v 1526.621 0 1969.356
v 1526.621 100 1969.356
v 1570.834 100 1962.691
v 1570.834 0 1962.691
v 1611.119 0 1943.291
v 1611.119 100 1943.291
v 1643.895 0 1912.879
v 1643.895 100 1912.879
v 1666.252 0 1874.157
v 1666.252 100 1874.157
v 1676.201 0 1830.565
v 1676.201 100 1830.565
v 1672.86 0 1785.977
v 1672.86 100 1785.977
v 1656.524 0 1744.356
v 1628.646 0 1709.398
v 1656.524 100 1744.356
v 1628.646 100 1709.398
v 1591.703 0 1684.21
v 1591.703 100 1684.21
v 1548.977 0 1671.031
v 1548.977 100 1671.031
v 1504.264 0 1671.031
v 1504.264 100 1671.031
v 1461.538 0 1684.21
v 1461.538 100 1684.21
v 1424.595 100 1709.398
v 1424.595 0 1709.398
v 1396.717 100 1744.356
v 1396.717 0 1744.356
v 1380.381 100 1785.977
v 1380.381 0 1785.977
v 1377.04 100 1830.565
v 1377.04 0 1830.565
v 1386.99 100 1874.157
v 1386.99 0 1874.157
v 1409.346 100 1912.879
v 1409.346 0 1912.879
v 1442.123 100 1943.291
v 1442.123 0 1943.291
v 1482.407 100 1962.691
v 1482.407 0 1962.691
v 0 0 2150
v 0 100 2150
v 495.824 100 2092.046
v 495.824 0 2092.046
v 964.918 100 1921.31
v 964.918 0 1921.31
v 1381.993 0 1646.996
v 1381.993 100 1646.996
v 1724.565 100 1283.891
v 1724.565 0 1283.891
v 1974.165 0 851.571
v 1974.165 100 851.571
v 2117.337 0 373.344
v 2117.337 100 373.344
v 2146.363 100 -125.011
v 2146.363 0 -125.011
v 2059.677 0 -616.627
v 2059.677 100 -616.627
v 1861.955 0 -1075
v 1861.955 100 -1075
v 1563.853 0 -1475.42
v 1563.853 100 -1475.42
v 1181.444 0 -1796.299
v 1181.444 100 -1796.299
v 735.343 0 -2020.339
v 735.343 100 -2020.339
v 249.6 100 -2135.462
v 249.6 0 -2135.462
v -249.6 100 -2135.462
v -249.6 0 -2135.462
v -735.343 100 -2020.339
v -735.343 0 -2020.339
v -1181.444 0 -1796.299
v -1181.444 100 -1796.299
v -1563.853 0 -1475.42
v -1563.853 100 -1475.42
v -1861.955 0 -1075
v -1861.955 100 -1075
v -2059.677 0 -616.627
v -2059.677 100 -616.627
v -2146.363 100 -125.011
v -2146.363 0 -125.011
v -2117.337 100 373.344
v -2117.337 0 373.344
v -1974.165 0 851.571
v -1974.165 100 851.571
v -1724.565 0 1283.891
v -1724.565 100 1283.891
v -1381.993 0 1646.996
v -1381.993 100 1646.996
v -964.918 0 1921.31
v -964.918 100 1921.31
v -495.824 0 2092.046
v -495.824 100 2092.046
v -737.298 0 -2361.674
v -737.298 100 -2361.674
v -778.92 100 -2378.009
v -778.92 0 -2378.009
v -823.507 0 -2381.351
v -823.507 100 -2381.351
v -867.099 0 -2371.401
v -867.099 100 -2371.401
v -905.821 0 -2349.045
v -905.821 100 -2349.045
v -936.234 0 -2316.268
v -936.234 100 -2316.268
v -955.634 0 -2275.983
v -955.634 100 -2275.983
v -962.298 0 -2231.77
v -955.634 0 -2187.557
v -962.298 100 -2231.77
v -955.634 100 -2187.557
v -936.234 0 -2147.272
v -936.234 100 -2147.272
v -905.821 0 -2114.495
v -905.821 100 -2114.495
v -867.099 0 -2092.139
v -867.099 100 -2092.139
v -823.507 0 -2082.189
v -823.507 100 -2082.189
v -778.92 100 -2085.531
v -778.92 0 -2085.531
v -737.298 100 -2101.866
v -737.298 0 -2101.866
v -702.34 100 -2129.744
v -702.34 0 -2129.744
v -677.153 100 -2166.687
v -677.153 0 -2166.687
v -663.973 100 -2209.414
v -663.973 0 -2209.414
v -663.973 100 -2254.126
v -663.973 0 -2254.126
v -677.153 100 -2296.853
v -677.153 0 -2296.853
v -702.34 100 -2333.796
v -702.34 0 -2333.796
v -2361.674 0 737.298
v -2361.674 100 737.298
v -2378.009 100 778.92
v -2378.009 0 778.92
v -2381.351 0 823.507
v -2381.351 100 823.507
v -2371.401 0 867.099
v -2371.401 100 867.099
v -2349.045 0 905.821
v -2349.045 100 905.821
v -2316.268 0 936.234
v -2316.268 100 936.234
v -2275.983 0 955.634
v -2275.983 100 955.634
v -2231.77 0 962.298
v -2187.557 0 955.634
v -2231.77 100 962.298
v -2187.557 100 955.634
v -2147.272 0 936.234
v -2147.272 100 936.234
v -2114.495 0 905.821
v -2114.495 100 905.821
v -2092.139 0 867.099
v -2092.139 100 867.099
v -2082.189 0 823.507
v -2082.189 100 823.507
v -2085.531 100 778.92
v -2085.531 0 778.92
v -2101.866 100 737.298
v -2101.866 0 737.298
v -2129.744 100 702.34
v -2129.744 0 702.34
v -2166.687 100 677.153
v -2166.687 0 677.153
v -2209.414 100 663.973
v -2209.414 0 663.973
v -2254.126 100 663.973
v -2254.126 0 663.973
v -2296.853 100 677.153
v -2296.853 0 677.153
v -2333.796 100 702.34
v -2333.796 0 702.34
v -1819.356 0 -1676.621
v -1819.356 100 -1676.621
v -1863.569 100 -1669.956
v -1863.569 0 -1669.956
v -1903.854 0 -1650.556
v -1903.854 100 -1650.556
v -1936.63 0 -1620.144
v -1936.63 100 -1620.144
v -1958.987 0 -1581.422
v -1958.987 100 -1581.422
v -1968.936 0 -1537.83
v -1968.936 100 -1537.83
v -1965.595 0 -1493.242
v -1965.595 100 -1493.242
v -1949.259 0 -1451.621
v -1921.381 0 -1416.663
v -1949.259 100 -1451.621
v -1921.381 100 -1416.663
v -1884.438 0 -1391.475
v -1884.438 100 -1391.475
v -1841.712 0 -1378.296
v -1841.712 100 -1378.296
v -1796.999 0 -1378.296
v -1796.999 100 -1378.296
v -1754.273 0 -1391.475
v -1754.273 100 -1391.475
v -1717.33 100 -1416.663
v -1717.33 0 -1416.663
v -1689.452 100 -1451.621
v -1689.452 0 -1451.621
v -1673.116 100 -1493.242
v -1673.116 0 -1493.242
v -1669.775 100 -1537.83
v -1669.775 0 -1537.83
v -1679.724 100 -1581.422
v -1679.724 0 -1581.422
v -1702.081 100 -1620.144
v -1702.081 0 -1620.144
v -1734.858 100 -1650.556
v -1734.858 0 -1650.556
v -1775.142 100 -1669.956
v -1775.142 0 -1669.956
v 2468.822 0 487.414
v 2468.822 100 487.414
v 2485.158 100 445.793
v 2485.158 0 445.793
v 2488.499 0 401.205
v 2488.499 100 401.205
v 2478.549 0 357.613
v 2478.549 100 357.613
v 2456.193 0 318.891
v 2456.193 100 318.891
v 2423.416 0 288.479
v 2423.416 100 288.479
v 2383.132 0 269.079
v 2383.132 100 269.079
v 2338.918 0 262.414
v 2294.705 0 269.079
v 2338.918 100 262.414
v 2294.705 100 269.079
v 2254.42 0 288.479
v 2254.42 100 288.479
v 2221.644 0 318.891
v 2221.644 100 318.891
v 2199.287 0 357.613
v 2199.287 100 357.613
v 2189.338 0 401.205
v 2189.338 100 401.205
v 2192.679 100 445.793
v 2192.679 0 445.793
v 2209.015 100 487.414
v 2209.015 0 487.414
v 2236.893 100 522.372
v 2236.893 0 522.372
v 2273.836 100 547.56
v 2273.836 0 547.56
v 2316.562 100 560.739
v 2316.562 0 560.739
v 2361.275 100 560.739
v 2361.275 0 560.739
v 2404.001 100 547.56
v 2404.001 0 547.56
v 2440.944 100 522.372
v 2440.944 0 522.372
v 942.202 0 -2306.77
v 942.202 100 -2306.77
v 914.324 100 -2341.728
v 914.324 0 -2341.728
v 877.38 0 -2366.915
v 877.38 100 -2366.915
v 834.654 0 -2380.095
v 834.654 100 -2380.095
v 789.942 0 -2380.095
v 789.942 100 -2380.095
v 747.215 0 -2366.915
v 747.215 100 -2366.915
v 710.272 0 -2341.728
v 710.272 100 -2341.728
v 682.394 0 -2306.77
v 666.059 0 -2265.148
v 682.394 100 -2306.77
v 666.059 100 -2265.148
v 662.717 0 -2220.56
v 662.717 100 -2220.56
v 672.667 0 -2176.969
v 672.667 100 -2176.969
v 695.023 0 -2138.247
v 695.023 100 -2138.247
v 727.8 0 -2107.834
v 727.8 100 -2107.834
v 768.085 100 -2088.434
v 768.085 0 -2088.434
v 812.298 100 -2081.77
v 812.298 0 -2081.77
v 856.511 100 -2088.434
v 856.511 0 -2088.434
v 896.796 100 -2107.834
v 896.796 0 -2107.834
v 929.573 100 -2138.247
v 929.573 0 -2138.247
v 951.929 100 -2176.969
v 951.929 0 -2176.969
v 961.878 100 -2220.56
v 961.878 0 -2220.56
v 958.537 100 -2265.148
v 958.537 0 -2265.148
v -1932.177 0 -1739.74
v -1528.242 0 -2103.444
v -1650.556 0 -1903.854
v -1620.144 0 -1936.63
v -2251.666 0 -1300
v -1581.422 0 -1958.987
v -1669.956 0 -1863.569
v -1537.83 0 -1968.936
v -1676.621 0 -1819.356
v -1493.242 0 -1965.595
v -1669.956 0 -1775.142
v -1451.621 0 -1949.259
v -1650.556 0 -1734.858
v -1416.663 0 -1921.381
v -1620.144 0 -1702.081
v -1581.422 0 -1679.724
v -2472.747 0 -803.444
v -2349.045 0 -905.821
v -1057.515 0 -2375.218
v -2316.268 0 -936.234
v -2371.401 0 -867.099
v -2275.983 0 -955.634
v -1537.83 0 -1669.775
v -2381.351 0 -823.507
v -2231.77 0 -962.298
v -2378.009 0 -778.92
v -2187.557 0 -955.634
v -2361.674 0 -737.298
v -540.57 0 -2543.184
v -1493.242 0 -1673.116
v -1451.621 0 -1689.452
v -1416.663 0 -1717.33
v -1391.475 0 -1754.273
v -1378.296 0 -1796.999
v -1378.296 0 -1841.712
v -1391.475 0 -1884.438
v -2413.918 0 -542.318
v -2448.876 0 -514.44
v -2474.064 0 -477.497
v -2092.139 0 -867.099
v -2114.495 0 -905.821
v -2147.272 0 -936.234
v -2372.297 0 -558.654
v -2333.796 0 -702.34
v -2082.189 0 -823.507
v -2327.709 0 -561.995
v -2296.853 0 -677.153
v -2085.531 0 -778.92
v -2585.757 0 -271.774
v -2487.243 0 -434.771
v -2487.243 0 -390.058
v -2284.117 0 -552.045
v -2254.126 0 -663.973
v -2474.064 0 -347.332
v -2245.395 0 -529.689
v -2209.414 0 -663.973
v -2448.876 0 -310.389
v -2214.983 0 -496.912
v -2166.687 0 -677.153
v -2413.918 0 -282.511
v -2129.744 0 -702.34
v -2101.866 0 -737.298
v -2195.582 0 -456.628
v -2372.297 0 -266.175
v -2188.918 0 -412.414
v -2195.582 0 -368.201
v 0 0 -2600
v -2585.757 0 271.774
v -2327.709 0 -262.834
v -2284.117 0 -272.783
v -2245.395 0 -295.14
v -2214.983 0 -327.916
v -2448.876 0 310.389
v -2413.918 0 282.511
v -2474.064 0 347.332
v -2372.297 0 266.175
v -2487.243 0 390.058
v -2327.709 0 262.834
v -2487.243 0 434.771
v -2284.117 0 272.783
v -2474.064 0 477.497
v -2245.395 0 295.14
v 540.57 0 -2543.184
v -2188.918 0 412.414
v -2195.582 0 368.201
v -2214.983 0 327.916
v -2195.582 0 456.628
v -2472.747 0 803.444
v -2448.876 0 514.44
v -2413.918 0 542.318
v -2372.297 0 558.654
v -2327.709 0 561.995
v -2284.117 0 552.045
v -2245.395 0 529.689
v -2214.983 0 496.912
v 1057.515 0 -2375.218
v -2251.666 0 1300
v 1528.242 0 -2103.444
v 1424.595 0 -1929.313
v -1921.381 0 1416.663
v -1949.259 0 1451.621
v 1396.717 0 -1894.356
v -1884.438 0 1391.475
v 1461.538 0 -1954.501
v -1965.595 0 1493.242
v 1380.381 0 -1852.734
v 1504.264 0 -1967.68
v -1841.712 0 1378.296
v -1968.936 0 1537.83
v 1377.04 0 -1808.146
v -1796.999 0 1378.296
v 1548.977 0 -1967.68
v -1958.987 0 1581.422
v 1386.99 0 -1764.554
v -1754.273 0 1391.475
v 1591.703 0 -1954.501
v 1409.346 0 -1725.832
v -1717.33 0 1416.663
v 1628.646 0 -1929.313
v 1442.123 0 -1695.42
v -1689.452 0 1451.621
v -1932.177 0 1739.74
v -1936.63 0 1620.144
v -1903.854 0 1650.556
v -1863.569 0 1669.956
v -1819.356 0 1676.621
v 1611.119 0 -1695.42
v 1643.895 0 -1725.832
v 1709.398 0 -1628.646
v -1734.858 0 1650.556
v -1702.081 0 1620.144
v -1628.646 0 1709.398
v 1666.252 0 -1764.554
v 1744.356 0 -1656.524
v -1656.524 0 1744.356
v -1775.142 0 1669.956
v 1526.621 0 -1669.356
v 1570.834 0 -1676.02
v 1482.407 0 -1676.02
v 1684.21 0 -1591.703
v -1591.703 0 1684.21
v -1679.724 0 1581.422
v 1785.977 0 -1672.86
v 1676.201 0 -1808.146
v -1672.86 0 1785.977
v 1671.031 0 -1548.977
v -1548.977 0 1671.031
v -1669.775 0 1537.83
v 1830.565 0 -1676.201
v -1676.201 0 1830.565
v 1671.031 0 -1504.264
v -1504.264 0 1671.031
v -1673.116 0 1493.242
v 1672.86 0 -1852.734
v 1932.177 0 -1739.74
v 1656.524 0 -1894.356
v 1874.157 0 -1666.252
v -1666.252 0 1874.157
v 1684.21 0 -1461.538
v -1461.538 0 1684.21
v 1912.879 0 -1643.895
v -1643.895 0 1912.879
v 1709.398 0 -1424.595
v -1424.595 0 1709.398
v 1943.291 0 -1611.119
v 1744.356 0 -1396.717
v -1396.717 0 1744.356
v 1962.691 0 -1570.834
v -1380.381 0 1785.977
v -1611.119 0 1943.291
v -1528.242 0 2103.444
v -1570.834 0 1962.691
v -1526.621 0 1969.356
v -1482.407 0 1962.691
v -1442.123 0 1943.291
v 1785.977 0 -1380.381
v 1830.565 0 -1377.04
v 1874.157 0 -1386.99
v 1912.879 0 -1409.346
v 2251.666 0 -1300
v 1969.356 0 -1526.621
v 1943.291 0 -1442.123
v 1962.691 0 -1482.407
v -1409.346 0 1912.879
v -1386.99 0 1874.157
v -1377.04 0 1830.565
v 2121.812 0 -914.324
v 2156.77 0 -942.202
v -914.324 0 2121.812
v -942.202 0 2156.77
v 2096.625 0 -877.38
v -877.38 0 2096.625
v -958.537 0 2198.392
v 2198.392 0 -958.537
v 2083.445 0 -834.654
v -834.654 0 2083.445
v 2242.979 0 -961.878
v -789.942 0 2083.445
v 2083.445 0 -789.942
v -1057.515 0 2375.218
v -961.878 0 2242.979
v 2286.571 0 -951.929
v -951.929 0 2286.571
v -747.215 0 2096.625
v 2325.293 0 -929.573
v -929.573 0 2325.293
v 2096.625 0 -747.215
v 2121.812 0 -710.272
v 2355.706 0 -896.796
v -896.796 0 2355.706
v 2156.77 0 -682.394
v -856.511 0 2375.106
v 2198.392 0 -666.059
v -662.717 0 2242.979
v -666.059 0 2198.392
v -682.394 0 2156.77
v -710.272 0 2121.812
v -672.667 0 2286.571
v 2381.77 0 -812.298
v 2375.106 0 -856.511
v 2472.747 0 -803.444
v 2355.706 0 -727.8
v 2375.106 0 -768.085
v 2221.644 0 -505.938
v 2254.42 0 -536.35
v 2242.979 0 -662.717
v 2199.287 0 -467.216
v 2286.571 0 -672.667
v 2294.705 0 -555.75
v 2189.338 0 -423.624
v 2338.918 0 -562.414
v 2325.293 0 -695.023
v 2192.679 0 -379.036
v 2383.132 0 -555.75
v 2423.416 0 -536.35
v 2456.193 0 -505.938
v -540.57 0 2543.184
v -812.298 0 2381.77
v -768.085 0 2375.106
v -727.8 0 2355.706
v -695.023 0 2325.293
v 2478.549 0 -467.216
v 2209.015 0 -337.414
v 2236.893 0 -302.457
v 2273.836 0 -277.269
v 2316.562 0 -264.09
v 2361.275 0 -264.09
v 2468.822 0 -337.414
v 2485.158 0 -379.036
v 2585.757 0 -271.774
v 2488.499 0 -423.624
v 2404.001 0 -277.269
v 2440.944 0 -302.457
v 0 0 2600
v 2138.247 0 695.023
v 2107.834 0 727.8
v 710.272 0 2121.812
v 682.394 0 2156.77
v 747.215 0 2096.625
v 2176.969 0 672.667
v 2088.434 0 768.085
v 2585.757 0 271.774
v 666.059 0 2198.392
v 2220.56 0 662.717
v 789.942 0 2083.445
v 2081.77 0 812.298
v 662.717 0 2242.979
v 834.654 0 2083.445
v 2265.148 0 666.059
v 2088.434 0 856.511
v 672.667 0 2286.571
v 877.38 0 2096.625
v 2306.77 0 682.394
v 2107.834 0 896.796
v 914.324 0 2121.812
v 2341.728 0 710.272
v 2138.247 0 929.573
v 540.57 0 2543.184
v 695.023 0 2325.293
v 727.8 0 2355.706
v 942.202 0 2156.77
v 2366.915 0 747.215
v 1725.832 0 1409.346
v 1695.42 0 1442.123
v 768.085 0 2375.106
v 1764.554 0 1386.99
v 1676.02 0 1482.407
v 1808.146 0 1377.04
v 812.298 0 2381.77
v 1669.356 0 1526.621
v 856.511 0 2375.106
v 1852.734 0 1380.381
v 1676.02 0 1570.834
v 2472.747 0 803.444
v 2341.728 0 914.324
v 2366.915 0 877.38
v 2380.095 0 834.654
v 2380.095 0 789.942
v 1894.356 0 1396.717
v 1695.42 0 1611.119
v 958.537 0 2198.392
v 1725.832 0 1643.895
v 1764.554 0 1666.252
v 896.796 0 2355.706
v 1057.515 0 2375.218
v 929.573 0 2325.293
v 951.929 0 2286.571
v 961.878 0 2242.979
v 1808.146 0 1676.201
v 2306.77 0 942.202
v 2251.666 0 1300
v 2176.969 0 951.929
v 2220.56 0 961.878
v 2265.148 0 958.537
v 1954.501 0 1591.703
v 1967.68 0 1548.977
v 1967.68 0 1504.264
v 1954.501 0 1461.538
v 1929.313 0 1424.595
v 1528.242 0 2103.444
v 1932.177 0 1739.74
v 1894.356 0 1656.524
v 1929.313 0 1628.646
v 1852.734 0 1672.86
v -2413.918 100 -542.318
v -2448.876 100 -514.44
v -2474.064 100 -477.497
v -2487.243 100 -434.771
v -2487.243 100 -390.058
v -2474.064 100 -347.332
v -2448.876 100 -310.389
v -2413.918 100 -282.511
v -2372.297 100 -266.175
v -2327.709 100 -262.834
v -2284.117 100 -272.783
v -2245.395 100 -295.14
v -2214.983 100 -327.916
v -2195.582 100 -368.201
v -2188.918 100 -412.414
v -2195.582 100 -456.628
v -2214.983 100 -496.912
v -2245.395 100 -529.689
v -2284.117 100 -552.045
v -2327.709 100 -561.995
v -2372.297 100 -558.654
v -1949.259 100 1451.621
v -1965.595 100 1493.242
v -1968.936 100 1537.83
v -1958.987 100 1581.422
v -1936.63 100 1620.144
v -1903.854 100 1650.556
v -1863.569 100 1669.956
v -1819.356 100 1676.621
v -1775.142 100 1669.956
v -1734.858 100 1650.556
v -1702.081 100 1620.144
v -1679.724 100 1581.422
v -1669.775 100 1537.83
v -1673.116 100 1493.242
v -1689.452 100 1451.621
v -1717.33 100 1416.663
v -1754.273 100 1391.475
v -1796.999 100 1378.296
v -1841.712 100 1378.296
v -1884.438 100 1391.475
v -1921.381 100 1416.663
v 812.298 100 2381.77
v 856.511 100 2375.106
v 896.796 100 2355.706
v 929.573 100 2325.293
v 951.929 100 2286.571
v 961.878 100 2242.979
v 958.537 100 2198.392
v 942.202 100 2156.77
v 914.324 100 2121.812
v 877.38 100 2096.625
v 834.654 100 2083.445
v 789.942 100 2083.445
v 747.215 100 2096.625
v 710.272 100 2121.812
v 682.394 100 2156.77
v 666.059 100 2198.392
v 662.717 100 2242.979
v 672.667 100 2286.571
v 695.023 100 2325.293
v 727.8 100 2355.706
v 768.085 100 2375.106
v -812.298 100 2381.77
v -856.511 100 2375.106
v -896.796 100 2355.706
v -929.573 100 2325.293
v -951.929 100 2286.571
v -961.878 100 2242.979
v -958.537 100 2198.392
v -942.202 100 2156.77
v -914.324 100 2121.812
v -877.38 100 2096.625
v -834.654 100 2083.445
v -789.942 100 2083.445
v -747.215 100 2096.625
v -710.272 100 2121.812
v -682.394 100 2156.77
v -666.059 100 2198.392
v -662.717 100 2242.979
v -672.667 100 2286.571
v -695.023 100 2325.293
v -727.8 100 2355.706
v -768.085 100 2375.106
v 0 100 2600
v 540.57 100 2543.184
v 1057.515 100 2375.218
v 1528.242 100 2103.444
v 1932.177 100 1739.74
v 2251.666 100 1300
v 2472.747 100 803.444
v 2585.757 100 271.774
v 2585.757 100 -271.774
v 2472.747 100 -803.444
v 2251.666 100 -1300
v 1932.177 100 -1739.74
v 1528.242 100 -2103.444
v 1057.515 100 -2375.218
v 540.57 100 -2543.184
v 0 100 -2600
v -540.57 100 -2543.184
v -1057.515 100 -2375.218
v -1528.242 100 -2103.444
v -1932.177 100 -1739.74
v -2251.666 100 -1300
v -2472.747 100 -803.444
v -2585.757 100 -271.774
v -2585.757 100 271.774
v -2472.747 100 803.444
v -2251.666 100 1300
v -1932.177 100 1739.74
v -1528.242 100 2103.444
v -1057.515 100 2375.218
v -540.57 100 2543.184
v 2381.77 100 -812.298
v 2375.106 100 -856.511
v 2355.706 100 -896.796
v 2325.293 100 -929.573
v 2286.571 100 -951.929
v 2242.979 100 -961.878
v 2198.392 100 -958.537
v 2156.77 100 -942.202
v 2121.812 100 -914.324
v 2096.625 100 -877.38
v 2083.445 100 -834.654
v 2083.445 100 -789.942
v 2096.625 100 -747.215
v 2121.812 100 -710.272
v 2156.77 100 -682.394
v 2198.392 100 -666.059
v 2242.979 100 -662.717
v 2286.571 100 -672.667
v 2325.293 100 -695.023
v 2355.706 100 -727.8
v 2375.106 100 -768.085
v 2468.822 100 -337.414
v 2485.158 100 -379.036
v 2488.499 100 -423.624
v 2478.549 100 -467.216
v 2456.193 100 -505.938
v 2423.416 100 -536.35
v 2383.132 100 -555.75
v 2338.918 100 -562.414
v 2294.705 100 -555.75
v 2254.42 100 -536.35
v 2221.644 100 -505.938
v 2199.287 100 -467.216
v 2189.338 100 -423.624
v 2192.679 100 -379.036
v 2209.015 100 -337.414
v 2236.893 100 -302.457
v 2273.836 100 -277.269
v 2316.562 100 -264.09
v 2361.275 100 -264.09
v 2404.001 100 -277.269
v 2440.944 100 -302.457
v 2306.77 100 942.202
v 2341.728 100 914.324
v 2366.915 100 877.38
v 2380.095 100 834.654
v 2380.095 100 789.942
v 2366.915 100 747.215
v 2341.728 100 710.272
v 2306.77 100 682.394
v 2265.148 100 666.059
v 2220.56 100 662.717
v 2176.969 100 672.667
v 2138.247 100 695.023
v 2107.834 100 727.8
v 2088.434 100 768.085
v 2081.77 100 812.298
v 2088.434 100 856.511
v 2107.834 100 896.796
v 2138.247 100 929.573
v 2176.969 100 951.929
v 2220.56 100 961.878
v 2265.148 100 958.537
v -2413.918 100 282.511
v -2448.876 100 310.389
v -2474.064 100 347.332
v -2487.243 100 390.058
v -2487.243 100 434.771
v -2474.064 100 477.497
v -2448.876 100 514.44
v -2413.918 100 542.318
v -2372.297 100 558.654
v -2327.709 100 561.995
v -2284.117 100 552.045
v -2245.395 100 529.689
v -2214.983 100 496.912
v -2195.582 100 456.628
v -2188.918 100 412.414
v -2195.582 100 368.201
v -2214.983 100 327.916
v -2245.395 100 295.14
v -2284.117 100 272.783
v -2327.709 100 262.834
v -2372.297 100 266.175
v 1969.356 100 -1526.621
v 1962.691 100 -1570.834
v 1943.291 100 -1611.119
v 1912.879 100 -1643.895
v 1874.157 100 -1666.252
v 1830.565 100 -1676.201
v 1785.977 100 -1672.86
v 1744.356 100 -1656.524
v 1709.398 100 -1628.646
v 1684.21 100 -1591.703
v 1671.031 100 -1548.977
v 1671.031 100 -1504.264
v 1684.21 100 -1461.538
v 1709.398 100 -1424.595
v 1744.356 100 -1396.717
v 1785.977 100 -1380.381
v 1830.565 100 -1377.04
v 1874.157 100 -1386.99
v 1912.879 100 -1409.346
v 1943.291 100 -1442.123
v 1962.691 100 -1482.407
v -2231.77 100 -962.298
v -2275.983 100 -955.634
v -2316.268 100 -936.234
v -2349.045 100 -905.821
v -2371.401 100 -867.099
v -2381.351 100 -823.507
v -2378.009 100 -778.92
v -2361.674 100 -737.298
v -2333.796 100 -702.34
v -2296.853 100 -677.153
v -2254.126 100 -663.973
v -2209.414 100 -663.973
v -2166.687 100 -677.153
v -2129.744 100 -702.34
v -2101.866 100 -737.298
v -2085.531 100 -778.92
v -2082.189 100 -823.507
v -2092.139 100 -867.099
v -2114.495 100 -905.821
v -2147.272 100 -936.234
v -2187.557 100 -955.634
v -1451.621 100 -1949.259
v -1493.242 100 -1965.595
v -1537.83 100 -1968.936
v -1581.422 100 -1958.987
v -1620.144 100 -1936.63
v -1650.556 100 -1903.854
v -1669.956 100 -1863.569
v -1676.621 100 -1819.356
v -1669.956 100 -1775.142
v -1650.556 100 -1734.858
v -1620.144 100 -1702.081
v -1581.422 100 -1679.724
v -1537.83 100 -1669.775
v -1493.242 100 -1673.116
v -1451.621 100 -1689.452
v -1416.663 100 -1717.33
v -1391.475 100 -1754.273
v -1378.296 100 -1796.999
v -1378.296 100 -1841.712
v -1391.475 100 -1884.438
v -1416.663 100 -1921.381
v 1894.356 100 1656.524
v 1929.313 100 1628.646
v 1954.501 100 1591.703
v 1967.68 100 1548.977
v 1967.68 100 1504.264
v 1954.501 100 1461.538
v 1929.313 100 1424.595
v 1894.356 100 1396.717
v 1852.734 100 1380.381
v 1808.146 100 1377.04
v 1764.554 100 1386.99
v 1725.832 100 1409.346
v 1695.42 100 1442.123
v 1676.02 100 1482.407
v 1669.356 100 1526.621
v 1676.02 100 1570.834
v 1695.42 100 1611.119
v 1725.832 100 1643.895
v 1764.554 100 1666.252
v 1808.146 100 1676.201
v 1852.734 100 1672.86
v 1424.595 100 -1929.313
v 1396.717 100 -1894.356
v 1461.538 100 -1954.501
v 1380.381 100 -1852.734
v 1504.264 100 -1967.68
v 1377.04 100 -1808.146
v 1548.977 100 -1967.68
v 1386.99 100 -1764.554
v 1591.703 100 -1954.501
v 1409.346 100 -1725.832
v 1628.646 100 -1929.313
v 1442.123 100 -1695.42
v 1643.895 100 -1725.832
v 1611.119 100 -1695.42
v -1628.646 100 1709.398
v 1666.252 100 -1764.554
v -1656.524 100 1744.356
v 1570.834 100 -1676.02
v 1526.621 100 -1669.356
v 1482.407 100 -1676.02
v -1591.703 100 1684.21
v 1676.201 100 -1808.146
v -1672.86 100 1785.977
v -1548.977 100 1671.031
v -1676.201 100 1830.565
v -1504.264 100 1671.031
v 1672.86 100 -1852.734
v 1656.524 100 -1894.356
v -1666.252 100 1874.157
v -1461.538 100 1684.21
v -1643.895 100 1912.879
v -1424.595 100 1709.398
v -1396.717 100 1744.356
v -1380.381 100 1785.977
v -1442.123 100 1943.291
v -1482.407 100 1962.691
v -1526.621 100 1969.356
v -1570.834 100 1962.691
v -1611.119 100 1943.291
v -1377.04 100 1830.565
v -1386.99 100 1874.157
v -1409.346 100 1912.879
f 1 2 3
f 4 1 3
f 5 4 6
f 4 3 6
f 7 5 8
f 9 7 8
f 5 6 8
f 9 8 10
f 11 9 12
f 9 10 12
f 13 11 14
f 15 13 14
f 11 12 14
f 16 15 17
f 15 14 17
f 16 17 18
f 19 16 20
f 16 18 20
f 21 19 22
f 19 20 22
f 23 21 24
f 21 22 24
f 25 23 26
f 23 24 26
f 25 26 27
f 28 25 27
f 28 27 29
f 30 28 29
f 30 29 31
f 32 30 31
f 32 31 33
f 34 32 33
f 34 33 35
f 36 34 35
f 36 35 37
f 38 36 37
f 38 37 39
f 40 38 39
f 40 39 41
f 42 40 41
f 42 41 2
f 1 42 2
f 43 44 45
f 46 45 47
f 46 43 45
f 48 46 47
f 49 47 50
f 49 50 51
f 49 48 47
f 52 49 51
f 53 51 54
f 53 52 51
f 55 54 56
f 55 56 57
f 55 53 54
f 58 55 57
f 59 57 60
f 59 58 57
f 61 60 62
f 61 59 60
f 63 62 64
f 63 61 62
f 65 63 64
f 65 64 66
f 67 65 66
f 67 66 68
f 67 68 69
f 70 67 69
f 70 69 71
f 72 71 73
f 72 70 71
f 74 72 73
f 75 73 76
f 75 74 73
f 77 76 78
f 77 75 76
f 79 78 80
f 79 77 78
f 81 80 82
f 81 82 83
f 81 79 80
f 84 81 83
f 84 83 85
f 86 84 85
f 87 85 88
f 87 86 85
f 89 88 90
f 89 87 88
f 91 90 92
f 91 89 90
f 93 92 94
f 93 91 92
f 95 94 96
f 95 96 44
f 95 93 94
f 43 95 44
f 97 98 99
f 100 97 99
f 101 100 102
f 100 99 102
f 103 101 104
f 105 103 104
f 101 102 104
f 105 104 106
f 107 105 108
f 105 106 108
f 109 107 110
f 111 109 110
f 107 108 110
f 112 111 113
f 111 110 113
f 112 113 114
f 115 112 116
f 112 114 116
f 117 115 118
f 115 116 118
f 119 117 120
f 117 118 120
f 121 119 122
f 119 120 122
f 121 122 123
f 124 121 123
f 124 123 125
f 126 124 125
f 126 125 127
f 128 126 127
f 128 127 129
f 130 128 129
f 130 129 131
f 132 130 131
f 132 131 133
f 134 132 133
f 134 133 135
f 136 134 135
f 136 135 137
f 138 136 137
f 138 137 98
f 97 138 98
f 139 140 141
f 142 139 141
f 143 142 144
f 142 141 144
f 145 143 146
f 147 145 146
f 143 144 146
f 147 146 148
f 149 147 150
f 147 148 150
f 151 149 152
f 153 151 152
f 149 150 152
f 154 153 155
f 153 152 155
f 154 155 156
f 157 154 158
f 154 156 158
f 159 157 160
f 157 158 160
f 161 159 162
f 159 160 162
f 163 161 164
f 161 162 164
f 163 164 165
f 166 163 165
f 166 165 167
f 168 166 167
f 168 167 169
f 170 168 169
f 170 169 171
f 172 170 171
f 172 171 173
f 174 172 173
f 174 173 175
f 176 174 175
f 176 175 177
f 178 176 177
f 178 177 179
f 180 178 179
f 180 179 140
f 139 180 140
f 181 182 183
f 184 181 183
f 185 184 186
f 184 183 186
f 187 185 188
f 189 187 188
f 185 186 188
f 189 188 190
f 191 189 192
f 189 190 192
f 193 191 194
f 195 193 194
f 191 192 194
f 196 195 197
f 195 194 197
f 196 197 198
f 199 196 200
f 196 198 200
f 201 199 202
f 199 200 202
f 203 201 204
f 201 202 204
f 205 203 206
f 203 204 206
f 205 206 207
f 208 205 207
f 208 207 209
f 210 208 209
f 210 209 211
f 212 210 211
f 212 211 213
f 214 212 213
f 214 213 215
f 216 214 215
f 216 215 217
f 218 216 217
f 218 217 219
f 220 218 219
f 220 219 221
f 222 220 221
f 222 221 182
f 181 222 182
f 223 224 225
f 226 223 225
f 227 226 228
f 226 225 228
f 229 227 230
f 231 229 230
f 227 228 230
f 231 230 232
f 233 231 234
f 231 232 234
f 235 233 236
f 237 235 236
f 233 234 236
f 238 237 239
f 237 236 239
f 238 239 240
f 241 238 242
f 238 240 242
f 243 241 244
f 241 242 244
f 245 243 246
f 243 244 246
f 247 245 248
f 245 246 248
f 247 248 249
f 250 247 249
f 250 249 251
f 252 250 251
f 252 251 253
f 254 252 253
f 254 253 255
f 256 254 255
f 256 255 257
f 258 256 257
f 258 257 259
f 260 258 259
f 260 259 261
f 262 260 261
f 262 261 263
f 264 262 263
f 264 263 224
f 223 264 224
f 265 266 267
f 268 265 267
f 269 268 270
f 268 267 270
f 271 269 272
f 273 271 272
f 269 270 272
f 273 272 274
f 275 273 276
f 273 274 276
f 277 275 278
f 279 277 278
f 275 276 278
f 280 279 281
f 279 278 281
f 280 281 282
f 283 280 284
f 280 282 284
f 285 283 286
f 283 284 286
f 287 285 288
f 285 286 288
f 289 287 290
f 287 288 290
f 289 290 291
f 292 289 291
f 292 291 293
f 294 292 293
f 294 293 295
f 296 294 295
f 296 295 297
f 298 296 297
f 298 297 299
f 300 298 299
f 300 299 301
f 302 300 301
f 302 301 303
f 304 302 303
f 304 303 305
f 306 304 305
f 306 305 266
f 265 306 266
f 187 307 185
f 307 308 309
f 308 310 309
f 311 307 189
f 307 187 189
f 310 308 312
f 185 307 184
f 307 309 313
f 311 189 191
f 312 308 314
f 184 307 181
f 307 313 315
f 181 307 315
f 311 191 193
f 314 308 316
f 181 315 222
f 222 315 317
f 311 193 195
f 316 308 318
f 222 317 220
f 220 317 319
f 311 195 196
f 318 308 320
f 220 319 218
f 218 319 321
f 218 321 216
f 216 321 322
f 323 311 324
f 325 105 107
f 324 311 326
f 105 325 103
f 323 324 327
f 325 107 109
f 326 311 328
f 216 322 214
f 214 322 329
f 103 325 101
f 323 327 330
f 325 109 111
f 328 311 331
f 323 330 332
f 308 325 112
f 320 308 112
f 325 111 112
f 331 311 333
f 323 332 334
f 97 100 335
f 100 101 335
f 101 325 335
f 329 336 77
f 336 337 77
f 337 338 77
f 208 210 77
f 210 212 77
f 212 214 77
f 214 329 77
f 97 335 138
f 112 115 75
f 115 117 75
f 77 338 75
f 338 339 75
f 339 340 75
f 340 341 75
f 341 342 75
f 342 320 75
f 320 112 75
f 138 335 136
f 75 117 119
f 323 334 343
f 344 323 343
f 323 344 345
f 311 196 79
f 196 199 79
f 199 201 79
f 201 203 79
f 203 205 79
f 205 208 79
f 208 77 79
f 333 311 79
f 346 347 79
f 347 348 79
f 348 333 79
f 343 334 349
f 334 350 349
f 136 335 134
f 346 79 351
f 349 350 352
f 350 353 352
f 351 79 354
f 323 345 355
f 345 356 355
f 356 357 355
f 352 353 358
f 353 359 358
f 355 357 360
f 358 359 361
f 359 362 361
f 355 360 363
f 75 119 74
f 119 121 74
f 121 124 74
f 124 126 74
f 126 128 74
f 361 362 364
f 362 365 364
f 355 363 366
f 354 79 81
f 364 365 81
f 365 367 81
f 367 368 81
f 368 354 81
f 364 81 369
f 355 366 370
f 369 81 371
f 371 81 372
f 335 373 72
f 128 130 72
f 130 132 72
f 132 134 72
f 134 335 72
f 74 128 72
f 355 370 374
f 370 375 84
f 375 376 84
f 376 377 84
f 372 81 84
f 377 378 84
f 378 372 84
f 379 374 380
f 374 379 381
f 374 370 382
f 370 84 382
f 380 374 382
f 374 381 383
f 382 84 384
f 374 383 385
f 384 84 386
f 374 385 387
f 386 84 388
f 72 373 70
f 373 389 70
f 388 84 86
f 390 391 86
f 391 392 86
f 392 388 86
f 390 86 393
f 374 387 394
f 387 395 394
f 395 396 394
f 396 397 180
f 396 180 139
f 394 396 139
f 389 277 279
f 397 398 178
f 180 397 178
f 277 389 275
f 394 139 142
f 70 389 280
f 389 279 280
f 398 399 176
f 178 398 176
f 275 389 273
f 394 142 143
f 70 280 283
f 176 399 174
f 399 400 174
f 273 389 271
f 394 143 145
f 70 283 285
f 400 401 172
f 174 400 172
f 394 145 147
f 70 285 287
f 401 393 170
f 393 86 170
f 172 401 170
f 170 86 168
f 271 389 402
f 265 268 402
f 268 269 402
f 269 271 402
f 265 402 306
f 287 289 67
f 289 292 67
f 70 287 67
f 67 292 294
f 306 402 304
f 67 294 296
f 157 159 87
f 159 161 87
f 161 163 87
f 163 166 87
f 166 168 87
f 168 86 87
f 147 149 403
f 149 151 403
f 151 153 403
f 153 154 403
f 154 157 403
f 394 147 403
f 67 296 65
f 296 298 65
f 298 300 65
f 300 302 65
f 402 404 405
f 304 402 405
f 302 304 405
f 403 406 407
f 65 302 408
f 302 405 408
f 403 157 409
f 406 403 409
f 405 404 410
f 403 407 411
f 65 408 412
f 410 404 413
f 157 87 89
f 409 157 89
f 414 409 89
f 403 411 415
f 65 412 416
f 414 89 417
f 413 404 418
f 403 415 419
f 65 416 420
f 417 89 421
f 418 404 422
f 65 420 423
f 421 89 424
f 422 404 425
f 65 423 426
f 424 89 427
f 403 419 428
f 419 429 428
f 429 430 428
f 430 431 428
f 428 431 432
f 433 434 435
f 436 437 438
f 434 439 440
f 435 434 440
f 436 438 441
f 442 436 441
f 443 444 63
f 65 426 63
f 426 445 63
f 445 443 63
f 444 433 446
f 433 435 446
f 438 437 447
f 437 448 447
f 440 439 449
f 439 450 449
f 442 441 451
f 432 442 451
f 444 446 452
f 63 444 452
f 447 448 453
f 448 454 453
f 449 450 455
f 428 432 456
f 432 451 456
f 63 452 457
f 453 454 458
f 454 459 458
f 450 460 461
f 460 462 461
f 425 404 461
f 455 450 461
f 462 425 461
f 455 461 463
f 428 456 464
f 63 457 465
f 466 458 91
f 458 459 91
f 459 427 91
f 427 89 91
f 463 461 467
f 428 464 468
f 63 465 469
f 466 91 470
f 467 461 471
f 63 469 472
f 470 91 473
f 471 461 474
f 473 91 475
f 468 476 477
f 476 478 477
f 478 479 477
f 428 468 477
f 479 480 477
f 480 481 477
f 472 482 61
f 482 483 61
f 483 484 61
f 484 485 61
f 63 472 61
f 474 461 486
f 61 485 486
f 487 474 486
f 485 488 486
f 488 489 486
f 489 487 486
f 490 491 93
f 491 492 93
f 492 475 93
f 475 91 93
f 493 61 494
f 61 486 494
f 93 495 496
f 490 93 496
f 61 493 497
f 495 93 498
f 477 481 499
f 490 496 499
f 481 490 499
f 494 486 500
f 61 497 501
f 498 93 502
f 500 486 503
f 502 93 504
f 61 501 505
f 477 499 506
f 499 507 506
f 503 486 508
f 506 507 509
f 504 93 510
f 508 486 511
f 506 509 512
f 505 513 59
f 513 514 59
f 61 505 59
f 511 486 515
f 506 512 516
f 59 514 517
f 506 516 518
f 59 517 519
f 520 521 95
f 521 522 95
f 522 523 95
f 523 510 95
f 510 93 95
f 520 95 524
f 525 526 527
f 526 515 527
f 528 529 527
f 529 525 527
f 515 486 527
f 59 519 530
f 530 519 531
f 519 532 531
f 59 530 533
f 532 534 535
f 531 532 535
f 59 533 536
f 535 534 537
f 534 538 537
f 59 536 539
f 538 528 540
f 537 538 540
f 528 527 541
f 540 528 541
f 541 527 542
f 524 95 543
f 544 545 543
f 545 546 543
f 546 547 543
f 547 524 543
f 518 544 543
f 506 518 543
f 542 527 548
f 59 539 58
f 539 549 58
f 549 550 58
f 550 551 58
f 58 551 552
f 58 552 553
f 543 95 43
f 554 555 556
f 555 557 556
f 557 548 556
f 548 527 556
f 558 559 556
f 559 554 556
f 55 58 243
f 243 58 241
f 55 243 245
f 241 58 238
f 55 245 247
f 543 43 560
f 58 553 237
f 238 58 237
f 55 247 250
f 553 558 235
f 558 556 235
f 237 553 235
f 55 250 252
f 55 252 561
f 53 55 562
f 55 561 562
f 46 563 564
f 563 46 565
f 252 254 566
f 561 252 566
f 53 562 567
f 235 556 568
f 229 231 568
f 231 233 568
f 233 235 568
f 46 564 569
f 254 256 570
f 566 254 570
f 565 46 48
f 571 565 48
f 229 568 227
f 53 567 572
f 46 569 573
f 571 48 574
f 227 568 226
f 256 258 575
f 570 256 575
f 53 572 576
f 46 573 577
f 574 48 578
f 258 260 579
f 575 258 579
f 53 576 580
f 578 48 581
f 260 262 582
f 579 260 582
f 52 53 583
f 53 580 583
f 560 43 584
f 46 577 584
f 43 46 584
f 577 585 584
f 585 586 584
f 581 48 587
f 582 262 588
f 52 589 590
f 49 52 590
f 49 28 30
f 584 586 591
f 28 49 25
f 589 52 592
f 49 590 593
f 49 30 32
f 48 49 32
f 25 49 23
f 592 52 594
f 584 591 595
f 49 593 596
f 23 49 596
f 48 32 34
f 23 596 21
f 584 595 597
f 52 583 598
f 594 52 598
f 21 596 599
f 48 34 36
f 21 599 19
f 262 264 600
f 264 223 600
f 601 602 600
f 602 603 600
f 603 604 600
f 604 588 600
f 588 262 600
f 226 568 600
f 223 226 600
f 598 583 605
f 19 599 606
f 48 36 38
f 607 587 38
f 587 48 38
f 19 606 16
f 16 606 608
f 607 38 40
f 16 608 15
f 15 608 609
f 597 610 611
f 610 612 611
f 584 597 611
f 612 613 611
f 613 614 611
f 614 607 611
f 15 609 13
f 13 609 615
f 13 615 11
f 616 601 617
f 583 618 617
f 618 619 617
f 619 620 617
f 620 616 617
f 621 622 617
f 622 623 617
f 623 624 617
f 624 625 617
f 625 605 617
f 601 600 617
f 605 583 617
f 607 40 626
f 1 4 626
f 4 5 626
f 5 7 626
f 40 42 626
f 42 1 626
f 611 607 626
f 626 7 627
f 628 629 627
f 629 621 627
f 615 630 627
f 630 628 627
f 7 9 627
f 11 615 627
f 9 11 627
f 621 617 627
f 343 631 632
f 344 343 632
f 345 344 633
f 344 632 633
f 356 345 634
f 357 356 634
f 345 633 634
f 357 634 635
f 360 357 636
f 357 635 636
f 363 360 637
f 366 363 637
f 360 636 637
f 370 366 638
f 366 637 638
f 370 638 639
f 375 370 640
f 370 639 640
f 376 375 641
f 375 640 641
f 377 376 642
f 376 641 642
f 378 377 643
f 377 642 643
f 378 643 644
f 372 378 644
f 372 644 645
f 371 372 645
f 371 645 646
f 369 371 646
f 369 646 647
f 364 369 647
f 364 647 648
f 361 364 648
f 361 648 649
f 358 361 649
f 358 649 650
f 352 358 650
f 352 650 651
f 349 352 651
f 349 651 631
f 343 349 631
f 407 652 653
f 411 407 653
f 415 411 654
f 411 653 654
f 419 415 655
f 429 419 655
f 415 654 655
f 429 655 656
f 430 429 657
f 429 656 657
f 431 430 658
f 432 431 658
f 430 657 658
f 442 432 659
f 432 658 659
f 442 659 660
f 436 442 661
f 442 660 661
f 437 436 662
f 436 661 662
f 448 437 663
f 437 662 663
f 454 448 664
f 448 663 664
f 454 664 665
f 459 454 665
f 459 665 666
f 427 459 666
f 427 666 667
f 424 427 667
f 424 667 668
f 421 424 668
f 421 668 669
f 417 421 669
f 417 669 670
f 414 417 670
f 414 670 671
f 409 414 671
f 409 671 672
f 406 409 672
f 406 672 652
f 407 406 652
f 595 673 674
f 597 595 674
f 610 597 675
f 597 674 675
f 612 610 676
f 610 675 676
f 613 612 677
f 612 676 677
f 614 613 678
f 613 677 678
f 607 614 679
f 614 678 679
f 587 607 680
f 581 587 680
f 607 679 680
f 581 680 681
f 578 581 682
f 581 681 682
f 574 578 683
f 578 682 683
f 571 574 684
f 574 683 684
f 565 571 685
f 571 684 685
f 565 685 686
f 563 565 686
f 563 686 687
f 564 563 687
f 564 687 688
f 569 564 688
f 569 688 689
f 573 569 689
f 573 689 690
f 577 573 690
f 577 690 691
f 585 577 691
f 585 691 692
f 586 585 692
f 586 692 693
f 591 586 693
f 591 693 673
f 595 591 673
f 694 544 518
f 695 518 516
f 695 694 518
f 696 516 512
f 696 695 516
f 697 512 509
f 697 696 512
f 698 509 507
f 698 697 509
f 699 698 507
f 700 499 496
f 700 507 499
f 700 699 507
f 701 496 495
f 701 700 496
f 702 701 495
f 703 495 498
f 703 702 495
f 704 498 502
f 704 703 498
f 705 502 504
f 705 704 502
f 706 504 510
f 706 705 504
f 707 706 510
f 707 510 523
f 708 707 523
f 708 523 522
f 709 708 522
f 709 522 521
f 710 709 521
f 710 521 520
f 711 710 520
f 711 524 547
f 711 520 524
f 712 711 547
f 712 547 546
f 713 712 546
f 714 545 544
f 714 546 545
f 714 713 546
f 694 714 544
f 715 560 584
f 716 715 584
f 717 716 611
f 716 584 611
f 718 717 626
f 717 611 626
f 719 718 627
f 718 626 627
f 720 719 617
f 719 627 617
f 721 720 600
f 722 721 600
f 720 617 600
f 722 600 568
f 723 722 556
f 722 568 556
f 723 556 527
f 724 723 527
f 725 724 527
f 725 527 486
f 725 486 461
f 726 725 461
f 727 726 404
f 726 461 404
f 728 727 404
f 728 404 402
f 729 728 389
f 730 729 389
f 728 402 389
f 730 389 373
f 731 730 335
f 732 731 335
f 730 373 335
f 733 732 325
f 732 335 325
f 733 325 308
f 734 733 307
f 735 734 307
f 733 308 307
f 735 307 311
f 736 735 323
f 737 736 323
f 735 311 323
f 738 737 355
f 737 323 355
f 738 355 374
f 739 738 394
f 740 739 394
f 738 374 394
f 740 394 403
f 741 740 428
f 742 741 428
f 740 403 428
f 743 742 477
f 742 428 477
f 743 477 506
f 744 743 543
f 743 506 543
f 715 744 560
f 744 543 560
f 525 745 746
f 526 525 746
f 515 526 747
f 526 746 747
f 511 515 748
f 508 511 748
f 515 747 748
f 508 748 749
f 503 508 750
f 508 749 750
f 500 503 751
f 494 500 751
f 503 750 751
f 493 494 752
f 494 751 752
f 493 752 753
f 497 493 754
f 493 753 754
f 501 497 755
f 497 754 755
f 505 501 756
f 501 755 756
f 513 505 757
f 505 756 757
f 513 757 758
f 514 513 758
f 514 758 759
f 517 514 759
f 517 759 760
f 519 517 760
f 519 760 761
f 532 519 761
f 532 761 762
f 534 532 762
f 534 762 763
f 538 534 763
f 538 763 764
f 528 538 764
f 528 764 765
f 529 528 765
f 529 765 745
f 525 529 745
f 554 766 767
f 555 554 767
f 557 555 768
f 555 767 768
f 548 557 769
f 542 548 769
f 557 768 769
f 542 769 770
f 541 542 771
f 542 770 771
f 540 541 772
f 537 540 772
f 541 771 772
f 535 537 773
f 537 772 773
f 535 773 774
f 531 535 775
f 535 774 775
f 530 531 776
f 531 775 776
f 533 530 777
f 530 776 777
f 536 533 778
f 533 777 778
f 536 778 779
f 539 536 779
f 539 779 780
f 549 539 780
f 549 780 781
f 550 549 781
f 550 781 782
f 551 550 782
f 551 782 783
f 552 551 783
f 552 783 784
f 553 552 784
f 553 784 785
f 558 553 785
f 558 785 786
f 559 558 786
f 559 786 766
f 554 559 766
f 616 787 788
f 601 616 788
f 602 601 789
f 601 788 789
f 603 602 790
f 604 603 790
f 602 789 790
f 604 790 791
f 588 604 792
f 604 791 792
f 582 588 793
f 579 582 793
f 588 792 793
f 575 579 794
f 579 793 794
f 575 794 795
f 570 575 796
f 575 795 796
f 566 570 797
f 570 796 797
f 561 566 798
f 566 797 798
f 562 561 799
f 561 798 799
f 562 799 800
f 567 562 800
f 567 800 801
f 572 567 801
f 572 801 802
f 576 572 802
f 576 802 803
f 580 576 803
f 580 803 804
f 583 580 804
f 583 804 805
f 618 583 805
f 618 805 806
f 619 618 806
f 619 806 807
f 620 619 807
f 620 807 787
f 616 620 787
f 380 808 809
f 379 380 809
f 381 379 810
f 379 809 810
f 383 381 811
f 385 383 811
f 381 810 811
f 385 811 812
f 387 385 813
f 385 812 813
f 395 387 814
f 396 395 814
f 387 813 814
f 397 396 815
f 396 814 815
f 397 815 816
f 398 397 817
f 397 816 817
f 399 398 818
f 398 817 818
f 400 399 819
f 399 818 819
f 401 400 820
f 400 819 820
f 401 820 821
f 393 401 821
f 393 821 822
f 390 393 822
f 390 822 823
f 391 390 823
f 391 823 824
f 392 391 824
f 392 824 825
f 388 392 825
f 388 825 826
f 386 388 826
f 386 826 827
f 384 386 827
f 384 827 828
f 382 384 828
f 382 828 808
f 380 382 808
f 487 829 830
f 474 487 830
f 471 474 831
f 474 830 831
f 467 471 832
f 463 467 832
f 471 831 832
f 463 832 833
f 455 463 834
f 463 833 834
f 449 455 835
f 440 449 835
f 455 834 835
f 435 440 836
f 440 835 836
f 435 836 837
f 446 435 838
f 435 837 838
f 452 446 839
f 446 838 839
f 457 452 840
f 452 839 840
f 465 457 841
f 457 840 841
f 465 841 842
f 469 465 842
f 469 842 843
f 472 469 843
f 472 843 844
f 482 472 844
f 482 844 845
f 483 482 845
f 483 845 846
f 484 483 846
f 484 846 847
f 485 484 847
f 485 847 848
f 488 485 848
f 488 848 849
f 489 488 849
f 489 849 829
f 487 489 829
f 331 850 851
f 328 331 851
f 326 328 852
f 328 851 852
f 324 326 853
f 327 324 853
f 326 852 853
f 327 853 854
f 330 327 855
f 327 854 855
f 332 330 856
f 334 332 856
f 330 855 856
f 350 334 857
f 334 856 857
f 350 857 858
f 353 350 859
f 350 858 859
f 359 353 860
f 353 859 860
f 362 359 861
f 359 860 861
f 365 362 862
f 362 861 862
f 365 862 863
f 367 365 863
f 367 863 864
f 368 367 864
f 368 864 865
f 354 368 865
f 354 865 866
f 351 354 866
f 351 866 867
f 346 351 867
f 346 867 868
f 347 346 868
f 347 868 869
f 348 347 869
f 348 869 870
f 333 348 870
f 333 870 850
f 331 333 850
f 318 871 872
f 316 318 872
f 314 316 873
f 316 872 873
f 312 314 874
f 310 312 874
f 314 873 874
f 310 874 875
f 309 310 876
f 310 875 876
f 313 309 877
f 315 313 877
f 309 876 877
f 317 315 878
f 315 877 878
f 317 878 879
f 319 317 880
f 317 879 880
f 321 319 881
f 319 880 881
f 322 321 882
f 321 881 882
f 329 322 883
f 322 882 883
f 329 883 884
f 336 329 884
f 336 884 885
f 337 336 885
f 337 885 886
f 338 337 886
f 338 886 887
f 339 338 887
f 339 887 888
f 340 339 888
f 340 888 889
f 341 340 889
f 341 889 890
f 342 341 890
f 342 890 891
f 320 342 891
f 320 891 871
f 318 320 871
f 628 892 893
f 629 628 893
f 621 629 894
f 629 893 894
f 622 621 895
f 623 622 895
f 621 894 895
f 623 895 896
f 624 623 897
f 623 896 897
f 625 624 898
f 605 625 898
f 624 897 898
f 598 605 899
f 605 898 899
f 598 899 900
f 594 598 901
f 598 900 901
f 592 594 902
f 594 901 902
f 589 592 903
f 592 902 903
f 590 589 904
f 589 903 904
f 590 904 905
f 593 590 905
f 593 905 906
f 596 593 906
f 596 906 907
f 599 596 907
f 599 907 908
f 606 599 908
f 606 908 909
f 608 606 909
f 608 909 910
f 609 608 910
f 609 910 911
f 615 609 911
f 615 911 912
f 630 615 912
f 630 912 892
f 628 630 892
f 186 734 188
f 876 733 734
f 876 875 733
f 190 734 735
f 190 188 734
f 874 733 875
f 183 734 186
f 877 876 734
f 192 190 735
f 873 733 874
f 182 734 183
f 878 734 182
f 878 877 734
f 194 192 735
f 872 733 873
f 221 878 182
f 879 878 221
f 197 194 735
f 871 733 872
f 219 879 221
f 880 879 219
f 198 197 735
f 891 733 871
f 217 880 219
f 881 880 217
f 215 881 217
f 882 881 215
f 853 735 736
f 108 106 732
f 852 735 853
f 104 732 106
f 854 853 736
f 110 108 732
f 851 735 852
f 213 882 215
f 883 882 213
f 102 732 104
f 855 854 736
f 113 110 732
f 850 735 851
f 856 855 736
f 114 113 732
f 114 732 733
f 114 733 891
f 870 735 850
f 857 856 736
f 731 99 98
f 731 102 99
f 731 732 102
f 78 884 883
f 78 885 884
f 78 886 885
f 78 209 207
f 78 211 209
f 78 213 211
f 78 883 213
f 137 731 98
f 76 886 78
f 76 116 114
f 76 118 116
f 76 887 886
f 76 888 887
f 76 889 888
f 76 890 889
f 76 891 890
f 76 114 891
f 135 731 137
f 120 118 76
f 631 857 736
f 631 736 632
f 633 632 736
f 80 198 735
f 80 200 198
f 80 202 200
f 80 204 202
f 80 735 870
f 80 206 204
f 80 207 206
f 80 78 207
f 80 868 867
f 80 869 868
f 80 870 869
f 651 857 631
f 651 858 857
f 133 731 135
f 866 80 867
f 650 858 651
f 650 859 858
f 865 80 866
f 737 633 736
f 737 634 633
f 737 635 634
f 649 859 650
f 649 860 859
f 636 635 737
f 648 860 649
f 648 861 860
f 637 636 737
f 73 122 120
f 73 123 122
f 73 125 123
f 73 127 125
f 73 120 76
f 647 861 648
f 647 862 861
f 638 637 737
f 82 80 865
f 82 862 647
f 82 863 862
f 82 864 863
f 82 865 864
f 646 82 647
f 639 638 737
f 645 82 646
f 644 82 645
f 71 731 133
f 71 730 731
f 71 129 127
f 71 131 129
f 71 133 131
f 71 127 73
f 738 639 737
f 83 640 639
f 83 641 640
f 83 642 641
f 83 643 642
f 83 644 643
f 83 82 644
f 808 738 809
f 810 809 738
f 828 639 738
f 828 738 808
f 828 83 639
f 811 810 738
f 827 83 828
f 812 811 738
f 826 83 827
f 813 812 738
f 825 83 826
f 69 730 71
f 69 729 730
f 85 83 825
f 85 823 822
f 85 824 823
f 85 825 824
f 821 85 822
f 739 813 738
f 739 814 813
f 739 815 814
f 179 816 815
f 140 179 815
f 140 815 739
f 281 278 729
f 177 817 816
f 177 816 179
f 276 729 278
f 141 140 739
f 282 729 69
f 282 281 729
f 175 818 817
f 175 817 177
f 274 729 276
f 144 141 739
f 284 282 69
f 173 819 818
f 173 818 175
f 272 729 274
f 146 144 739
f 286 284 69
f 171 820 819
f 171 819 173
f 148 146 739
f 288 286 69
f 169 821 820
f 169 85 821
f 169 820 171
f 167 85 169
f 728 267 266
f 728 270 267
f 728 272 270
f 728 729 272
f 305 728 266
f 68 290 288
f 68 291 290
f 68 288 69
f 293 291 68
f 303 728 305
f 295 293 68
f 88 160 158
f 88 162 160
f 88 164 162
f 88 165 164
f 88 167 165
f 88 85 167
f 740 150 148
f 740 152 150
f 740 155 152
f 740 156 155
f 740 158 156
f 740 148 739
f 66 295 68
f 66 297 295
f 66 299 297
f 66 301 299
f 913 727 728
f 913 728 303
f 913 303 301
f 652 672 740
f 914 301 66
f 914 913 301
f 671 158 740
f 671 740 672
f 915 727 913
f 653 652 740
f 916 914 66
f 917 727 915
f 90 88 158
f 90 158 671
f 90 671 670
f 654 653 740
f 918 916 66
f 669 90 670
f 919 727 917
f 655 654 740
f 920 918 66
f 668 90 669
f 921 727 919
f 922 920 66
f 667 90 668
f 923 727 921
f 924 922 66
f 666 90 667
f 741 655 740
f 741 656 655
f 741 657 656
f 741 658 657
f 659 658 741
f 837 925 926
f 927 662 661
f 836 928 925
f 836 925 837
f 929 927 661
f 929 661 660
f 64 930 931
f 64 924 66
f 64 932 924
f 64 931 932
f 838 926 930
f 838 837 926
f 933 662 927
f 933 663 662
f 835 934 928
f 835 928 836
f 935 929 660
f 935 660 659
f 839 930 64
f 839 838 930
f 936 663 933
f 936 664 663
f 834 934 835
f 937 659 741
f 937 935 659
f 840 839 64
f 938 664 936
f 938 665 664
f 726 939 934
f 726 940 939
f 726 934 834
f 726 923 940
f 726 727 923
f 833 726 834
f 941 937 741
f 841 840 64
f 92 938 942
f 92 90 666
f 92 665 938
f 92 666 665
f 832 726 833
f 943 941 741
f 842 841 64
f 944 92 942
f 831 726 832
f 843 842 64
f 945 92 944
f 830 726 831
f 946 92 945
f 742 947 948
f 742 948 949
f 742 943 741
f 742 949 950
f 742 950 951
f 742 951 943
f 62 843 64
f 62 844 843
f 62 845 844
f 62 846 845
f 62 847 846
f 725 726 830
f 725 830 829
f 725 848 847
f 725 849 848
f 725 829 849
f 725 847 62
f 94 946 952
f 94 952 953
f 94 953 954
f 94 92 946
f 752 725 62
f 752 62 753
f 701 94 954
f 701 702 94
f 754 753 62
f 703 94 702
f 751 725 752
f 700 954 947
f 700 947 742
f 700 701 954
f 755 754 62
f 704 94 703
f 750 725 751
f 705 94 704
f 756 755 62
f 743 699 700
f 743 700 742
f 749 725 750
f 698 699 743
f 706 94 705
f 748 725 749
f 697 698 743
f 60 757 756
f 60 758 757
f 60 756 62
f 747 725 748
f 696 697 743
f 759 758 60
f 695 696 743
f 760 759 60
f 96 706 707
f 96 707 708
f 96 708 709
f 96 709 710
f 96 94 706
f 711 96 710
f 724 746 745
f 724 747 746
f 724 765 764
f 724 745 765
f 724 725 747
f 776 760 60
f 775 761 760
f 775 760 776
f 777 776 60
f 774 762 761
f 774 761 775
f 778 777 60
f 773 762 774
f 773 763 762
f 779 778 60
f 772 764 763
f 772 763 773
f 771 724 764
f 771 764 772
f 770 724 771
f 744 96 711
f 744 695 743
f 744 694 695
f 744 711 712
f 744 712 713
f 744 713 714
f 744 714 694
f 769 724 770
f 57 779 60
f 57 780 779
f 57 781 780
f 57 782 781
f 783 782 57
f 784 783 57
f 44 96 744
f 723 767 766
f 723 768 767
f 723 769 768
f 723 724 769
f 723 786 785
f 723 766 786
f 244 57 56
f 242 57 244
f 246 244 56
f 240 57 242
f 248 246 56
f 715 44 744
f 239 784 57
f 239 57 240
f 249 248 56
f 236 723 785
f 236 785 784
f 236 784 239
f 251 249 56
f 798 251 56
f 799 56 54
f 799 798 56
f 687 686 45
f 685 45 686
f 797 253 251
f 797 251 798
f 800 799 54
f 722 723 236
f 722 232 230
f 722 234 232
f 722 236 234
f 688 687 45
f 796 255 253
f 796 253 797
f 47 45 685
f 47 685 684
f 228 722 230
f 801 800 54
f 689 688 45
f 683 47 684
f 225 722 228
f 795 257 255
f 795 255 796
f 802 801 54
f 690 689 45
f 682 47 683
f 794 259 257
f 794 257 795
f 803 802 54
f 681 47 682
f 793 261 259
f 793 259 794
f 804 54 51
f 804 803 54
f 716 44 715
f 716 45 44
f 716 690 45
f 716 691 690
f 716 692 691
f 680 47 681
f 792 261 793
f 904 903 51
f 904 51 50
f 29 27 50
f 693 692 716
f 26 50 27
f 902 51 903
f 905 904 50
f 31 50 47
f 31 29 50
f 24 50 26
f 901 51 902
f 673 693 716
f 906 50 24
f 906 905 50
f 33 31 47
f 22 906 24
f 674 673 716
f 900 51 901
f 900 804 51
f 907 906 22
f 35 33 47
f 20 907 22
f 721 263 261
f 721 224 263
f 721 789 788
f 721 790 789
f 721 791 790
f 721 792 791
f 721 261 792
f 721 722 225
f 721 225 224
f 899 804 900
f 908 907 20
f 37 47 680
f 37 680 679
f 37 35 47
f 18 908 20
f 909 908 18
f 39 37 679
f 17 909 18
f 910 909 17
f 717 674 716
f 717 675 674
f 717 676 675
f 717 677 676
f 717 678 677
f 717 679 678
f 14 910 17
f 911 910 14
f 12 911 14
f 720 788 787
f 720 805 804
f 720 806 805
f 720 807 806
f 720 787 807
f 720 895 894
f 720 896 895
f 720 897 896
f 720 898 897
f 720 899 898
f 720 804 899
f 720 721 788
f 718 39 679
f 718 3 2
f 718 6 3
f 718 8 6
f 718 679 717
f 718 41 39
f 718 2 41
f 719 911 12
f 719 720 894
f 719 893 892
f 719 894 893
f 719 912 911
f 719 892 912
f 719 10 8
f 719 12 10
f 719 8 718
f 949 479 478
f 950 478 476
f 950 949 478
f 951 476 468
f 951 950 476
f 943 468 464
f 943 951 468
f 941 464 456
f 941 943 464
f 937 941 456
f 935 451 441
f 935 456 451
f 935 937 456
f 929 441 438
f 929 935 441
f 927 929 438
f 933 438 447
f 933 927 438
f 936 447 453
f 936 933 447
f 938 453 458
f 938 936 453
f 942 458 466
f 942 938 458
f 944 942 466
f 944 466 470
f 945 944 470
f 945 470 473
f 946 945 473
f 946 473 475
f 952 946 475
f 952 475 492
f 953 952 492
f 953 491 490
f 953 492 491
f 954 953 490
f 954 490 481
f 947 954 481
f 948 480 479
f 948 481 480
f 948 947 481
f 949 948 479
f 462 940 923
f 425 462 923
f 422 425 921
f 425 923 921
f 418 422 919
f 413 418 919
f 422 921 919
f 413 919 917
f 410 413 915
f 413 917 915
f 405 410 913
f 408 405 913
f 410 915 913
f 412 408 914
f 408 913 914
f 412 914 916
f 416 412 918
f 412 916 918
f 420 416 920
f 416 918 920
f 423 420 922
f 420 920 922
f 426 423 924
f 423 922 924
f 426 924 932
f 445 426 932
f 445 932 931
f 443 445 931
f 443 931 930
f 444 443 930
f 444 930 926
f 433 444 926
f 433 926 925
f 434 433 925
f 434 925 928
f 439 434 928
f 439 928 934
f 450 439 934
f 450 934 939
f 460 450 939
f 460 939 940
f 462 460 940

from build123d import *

# Parameters (mm, degrees)
SKETCH1_R               = 2600
SKETCH1_R_2             = 2150
BOSS_EXTRUDE1_DEPTH     = 100
SKETCH2_R               = 150
CUT_EXTRUDE1_DEPTH      = 3679.31483155
CIRPATTERN1_COUNT       = 5
CIRPATTERN1_ANGLE       = 120
MIRROR1_COPY_1_SKETCH_R = 150
MIRROR1_COPY_1_DEPTH    = 3679.31483155
MIRROR1_COPY_2_SKETCH_R = 150
MIRROR1_COPY_2_DEPTH    = 3679.31483155
MIRROR1_COPY_3_SKETCH_R = 150
MIRROR1_COPY_3_DEPTH    = 3679.31483155
MIRROR1_COPY_4_SKETCH_R = 150
MIRROR1_COPY_4_DEPTH    = 3679.31483155


with BuildPart() as part:
    # Sketch1 → Boss-Extrude1 (new body)
    with BuildSketch(Plane(origin=(0, 0, 0), x_dir=(1, 0, 0), z_dir=(0, 1, 0))):
        with Locations(Location((0, 0, 0), (0, 0, 270))):
            Circle(SKETCH1_R)
        with Locations(Location((0, 0, 0), (0, 0, 270))):
            Circle(SKETCH1_R_2, mode=Mode.SUBTRACT)
    extrude(amount=BOSS_EXTRUDE1_DEPTH)

    # Sketch2 → Cut-Extrude1 (cut, through all)
    with BuildSketch(Plane(origin=(0, 100, 0), x_dir=(1, 0, 0), z_dir=(0, 1, 0))):
        with Locations(Location((812.297840398, -2231.769974367, 0), (0, 0, 270))):
            Circle(SKETCH2_R)
        with Locations(Location((1526.620573006, -1819.355552408, 0), (0, 0, 270))):
            Circle(SKETCH2_R)
    cut_extrude1 = extrude(amount=-CUT_EXTRUDE1_DEPTH, mode=Mode.SUBTRACT)

    # CirPattern1: Cut-Extrude1 ×5 about axis
    cirpattern1_axis = Axis((0, 0, 0), (0, 1, 0))
    for i in range(1, CIRPATTERN1_COUNT):
        add(cut_extrude1.rotate(cirpattern1_axis, i * CIRPATTERN1_ANGLE / (CIRPATTERN1_COUNT - 1)), mode=Mode.SUBTRACT)

    # Mirror1: Cut-Extrude1 across plane
    add(cut_extrude1.mirror(Plane(origin=(0, 0, 0), x_dir=(0, 0, 1), z_dir=(1, 0, 0))), mode=Mode.SUBTRACT)

    # Mirror1 copy 1 sketch → Mirror1 copy 1 (cut, through all)
    with BuildSketch(Plane(origin=(0, 100, 0), x_dir=(-0.866025403784438, 0, -0.5000000000000011), z_dir=(0, 1, 0))):
        with Locations((812.297840398, 2231.769974367)):
            Circle(MIRROR1_COPY_1_SKETCH_R)
        with Locations((1526.620573006, 1819.355552408)):
            Circle(MIRROR1_COPY_1_SKETCH_R)
    extrude(amount=-MIRROR1_COPY_1_DEPTH, mode=Mode.SUBTRACT)

    # Mirror1 copy 2 sketch → Mirror1 copy 2 (cut, through all)
    with BuildSketch(Plane(origin=(0, 100, 0), x_dir=(-0.4999999999999978, 0, -0.8660254037844399), z_dir=(0, 1, 0))):
        with Locations((812.297840398, 2231.769974367)):
            Circle(MIRROR1_COPY_2_SKETCH_R)
        with Locations((1526.620573006, 1819.355552408)):
            Circle(MIRROR1_COPY_2_SKETCH_R)
    extrude(amount=-MIRROR1_COPY_2_DEPTH, mode=Mode.SUBTRACT)

    # Mirror1 copy 3 sketch → Mirror1 copy 3 (cut, through all)
    with BuildSketch(Plane(origin=(0, 100, 0), x_dir=(0, 0, -1), z_dir=(0, 1, 0))):
        with Locations((812.297840398, 2231.769974367)):
            Circle(MIRROR1_COPY_3_SKETCH_R)
        with Locations((1526.620573006, 1819.355552408)):
            Circle(MIRROR1_COPY_3_SKETCH_R)
    extrude(amount=-MIRROR1_COPY_3_DEPTH, mode=Mode.SUBTRACT)

    # Mirror1 copy 4 sketch → Mirror1 copy 4 (cut, through all)
    with BuildSketch(Plane(origin=(0, 100, 0), x_dir=(0.5000000000000044, 0, -0.866025403784436), z_dir=(0, 1, 0))):
        with Locations((812.297840398, 2231.769974367)):
            Circle(MIRROR1_COPY_4_SKETCH_R)
        with Locations((1526.620573006, 1819.355552408)):
            Circle(MIRROR1_COPY_4_SKETCH_R)
    extrude(amount=-MIRROR1_COPY_4_DEPTH, mode=Mode.SUBTRACT)


solid = part.part
